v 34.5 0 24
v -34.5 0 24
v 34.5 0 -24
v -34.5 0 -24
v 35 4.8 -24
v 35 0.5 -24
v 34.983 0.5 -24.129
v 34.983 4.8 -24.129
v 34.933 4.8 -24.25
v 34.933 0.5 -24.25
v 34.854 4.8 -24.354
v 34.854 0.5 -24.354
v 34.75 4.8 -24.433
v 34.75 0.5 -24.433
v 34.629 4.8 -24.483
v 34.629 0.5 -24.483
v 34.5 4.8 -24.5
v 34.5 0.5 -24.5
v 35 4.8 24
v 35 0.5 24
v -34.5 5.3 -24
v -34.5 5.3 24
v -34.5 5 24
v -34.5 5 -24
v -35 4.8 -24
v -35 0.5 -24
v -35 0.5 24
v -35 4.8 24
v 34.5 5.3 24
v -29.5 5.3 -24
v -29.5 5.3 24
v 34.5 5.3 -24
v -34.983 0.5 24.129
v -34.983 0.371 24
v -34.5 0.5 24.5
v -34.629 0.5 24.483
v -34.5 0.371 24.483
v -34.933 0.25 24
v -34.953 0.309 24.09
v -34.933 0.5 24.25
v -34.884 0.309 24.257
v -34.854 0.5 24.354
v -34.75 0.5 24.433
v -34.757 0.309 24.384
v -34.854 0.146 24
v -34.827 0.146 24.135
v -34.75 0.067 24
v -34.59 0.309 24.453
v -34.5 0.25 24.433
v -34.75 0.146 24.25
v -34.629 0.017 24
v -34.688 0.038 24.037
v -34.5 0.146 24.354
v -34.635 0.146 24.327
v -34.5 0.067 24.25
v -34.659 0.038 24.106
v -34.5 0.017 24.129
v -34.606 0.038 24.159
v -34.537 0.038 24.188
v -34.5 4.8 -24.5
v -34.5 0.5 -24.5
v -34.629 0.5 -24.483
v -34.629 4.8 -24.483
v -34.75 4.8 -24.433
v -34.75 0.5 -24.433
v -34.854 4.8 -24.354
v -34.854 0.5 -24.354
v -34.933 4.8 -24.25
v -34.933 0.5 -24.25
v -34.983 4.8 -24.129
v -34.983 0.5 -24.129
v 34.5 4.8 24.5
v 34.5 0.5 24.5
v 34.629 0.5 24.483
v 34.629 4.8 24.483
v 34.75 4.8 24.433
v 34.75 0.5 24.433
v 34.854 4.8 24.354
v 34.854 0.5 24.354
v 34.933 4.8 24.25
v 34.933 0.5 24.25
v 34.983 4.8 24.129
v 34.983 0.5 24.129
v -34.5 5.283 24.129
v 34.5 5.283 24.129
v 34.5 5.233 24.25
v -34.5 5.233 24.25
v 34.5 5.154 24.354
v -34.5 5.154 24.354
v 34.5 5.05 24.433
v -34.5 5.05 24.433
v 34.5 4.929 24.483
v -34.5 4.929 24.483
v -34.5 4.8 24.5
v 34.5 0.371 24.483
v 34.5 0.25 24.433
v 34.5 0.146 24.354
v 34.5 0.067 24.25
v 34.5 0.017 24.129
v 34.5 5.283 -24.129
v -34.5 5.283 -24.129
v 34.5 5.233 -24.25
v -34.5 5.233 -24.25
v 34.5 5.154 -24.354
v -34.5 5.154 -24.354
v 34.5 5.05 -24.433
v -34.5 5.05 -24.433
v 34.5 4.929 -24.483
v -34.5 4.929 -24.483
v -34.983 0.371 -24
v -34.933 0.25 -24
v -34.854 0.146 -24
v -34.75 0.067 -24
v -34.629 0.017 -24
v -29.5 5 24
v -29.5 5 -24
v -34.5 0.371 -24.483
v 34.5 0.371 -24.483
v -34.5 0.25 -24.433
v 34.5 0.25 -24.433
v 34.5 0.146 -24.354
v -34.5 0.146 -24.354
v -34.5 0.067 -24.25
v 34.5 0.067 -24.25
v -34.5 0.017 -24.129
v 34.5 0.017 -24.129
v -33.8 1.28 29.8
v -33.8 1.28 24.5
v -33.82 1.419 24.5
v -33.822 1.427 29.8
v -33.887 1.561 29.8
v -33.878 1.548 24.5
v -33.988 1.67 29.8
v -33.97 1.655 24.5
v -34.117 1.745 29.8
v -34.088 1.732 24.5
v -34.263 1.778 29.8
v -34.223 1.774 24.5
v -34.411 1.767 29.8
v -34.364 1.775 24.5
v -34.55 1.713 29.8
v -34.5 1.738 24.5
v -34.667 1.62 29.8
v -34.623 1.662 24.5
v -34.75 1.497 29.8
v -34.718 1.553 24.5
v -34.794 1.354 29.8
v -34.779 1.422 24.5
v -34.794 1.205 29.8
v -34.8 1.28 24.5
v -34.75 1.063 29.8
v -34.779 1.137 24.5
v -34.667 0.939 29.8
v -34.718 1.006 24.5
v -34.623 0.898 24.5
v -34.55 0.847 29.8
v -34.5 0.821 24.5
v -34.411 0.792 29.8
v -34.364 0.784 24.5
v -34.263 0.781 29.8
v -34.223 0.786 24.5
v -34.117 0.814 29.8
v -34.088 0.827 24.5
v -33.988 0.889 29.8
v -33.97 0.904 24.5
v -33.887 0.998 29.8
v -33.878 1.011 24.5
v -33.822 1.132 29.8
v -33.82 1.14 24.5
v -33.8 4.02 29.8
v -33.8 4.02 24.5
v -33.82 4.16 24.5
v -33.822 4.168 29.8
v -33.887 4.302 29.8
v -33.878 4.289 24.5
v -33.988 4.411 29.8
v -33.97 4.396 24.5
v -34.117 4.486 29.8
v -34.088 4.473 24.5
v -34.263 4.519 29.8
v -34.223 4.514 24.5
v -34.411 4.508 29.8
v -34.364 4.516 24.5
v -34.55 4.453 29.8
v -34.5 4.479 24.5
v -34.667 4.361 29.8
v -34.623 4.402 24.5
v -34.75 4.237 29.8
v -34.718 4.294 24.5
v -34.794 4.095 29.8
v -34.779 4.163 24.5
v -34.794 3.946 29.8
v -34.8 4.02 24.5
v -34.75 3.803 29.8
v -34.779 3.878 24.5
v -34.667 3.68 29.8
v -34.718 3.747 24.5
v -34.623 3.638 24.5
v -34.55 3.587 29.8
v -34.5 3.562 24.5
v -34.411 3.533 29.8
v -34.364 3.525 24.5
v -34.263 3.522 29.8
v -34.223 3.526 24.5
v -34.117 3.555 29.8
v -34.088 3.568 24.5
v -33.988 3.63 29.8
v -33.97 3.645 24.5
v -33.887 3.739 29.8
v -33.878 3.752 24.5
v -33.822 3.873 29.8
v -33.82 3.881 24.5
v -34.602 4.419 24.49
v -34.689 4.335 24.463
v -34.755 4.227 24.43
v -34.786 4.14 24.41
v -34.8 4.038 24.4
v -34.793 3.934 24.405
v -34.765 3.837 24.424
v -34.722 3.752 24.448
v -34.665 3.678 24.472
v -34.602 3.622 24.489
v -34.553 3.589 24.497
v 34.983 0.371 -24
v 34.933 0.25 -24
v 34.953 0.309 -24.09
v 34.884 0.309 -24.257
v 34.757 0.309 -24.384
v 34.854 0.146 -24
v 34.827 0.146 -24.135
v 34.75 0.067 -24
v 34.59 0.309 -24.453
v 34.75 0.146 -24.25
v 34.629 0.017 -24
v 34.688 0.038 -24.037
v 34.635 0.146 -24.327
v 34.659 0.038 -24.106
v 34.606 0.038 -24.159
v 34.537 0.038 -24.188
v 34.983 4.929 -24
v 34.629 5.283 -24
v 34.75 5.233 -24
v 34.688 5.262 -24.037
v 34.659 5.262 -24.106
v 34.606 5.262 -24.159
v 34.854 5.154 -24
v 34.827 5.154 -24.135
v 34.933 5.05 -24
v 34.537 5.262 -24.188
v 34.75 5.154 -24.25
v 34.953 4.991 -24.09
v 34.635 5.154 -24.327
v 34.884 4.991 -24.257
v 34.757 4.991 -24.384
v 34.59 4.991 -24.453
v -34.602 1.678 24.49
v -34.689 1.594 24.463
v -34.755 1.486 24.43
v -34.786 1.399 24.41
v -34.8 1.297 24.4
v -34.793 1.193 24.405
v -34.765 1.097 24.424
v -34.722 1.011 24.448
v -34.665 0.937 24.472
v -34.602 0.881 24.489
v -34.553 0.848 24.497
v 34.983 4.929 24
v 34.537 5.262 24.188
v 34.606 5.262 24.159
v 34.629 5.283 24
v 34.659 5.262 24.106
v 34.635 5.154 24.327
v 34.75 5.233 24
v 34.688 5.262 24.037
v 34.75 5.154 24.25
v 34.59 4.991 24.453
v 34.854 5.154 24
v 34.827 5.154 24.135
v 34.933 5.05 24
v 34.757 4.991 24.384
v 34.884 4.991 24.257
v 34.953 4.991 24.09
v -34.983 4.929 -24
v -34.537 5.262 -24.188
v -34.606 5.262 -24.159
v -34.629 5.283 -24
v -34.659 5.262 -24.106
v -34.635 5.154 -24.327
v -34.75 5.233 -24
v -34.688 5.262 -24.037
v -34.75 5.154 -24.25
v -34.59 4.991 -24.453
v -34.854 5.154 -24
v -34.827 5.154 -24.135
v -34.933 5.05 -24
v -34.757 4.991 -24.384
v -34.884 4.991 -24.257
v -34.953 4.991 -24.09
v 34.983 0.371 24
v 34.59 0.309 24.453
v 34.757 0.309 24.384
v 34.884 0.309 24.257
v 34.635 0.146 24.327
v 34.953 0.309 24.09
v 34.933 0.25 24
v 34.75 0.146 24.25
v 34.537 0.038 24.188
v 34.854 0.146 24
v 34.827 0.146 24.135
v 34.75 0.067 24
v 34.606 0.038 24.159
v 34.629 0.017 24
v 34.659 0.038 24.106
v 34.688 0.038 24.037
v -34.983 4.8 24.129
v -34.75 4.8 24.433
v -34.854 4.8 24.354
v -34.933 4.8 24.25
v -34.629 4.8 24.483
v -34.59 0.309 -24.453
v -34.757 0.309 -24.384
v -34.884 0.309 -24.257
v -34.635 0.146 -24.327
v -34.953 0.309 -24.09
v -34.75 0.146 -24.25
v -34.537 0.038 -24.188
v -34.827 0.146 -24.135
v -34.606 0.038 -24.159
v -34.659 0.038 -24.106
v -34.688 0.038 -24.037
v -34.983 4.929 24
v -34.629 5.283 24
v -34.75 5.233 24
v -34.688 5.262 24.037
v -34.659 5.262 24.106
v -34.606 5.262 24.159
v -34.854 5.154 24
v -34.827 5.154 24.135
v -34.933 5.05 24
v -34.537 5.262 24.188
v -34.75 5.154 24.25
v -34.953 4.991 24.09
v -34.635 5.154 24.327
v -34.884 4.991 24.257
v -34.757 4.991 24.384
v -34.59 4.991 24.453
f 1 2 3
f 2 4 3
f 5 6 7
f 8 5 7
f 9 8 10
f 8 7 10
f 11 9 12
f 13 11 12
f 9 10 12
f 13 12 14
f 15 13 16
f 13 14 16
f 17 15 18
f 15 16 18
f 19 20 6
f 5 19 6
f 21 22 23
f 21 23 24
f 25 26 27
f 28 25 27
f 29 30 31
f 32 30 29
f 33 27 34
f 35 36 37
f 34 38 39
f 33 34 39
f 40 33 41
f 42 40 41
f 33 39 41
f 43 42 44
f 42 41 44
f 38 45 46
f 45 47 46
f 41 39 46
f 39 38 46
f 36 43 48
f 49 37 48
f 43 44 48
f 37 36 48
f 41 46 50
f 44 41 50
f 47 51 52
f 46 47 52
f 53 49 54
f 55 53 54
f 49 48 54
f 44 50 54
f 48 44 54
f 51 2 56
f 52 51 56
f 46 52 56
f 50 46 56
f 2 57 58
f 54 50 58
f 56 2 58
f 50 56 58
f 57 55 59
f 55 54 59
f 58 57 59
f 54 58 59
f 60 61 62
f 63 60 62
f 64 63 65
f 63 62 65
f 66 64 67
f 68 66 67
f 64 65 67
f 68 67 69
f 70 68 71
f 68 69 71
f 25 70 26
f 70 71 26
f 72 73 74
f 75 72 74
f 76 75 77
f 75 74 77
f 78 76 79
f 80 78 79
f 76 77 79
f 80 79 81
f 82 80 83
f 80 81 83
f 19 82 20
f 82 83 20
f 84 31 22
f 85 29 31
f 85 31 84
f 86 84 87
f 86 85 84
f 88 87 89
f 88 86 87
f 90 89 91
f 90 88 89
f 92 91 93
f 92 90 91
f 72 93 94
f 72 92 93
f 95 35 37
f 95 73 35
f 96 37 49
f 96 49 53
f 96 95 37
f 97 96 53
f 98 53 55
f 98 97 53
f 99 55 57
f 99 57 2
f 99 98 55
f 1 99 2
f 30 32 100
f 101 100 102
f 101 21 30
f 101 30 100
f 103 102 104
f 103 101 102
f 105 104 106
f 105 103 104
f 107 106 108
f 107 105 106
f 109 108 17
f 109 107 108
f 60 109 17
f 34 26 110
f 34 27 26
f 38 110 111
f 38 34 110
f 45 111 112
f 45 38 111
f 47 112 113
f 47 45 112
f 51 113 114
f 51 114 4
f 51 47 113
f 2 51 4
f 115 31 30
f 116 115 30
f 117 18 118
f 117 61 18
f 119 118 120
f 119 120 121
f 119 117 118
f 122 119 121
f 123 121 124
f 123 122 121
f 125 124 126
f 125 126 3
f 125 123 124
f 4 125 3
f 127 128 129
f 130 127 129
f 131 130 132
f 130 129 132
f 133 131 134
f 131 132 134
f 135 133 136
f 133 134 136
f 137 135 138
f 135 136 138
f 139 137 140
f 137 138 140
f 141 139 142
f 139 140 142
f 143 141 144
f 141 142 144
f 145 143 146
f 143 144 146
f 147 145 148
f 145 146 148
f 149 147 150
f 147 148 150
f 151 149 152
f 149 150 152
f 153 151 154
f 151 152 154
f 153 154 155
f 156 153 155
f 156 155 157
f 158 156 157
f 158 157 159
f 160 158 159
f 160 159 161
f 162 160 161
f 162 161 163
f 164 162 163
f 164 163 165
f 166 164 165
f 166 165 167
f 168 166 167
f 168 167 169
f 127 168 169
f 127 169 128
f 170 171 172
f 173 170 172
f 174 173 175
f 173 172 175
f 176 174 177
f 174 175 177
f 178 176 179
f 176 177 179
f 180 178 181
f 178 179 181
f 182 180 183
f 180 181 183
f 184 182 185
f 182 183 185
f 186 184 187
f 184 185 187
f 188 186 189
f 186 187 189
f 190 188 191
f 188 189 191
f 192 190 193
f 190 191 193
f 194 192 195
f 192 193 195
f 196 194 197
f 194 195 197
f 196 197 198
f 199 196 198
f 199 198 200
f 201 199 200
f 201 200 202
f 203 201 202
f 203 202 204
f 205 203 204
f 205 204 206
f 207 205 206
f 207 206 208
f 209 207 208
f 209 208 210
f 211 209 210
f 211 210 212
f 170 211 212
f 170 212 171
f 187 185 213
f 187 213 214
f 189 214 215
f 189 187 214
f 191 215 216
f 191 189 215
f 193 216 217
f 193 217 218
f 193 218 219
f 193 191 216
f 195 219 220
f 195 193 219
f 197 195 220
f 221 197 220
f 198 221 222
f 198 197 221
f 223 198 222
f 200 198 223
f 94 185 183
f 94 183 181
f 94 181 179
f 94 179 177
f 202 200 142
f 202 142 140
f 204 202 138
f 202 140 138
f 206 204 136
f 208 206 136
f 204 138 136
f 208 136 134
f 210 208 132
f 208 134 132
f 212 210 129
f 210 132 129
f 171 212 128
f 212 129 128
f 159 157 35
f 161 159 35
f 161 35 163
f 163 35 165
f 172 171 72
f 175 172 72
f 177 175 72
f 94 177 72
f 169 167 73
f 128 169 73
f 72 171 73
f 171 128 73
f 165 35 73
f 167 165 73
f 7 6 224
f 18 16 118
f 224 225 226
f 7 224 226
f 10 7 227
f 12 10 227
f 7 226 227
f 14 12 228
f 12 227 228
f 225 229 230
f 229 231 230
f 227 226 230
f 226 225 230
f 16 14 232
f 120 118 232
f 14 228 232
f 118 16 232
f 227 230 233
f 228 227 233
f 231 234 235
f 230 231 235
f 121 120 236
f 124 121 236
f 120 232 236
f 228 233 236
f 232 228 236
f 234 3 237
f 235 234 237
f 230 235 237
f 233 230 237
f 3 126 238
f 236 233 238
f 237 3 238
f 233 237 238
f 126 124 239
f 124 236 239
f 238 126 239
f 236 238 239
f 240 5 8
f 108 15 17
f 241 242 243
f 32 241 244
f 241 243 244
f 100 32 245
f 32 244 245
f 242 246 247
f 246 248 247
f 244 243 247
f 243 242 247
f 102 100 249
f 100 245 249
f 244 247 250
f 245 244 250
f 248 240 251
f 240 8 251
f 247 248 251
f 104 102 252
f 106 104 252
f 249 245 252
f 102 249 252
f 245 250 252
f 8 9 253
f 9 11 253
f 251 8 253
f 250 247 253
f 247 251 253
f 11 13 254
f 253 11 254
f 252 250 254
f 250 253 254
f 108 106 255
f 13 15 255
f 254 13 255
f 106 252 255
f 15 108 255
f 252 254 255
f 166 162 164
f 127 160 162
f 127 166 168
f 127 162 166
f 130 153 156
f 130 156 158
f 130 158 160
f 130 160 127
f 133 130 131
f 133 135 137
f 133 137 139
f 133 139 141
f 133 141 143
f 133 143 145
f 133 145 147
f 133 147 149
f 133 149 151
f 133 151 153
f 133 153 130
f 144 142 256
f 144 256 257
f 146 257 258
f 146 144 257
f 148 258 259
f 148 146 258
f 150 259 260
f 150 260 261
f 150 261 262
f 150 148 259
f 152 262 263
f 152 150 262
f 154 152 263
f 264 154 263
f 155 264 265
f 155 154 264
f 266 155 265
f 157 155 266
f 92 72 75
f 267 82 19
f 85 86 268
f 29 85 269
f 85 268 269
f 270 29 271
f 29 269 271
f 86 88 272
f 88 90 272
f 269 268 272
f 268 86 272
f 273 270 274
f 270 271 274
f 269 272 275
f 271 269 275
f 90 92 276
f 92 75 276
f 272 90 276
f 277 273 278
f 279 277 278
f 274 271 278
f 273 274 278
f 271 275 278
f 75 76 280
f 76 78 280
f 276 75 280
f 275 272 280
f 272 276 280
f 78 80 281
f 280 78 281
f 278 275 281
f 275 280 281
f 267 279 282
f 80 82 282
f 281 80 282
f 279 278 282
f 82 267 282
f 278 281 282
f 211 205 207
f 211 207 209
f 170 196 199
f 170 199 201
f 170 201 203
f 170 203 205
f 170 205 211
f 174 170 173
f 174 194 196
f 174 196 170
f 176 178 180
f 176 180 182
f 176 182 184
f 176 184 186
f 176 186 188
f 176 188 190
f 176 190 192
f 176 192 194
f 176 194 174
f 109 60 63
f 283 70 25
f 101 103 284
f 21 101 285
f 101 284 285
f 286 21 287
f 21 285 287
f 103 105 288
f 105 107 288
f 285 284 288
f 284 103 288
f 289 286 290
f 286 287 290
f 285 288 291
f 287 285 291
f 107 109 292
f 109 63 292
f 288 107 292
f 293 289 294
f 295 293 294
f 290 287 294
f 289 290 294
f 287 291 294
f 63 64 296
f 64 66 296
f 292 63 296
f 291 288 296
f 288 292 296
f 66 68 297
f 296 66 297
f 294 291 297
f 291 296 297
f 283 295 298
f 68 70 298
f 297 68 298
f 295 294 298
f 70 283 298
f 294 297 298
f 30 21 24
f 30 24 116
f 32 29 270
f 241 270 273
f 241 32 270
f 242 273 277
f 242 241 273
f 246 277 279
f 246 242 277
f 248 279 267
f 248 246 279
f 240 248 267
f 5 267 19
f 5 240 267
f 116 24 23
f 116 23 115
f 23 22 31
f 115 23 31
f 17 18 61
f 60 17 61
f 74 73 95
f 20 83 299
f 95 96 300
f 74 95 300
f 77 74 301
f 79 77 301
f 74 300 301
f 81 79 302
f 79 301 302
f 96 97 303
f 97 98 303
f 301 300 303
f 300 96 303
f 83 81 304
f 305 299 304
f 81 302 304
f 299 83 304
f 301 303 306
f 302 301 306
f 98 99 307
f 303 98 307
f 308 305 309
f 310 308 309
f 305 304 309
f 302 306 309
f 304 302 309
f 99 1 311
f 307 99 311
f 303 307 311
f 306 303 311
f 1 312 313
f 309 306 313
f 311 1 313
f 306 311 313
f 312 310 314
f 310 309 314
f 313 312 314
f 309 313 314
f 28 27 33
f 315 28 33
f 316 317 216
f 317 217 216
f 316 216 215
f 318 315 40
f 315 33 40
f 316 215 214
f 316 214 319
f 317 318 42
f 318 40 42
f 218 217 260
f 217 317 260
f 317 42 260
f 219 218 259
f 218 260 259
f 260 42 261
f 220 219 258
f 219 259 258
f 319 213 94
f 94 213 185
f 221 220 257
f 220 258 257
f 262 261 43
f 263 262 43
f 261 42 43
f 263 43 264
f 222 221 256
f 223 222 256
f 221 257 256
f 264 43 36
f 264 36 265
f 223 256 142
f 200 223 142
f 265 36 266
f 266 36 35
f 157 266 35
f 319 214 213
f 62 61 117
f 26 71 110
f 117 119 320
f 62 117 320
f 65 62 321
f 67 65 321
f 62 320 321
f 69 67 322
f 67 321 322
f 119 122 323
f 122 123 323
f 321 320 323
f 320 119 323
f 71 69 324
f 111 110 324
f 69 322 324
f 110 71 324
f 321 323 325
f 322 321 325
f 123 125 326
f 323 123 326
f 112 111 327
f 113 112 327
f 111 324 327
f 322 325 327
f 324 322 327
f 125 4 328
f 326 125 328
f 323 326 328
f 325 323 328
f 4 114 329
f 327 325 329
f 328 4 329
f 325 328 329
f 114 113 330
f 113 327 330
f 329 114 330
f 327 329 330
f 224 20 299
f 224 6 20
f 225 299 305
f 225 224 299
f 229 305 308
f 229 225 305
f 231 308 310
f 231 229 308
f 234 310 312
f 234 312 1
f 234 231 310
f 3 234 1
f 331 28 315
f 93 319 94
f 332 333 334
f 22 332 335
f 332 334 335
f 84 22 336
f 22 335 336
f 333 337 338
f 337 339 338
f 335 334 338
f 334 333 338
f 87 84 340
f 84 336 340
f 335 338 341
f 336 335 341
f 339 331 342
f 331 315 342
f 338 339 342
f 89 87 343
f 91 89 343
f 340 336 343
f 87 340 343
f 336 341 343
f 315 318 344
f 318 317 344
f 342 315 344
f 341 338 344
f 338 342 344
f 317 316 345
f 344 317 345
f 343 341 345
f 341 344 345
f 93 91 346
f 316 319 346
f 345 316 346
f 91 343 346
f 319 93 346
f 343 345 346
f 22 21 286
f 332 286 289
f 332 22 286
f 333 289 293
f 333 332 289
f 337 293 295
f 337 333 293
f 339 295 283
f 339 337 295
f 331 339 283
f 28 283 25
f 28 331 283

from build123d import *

# Parameters (mm, degrees)
BOSS_EXTRUDE2_DEPTH      = 5.3
SKETCH2_R                = 0.5
BOSS_EXTRUDE3_DEPTH      = 5.3
BOSS_EXTRUDE3_DEPTH_BACK = 1
FILLET2_R                = 0.5
SKETCH4_W                = 5
SKETCH4_H                = 48
CUT_EXTRUDE1_DEPTH       = 0.3


with BuildPart() as part:
    # Sketch1 → Boss-Extrude2 (new body)
    with BuildSketch(Plane(origin=(0, 0, 0), x_dir=(1, 0, 0), z_dir=(0, 1, 0))):
        with BuildLine():
            Line((-34.5, -24.5), (34.5, -24.5))
            ThreePointArc((34.5, -24.5), (34.853553391, -24.353553391), (35, -24))
            Line((35, -24), (35, 24))
            ThreePointArc((35, 24), (34.853553391, 24.353553391), (34.5, 24.5))
            Line((34.5, 24.5), (-34.5, 24.5))
            ThreePointArc((-34.5, 24.5), (-34.853553391, 24.353553391), (-35, 24))
            Line((-35, 24), (-35, -24))
            ThreePointArc((-35, -24), (-34.853553391, -24.353553391), (-34.5, -24.5))
        make_face()
    extrude(amount=BOSS_EXTRUDE2_DEPTH)

    # Sketch2 → Boss-Extrude3 (add, two sides)
    with BuildSketch(Plane.XY.offset(24.5)) as boss_extrude3_sk:
        with Locations((-34.3, 1.279563796)):
            Circle(SKETCH2_R)
        with Locations((-34.3, 4.020436204)):
            Circle(SKETCH2_R)
    extrude(amount=BOSS_EXTRUDE3_DEPTH)
    extrude(boss_extrude3_sk.sketch, amount=-BOSS_EXTRUDE3_DEPTH_BACK)

    # Fillet2
    fillet2_edges = [part.edges().sort_by_distance(p)[0] for p in [
        (34.853553391, 5.3, 24.353553391),
        (0, 0, 24.5),
        (-34.853553391, 0, 24.353553391),
        (35, 5.3, 0),
        (34.853553391, 5.3, -24.353553391),
        (0, 5.3, -24.5),
        (-34.853553391, 5.3, -24.353553391),
        (-35, 5.3, 0),
        (-34.853553391, 5.3, 24.353553391),
        (0, 5.3, 24.5),
        (-35, 0, 0),
        (-34.853553391, 0, -24.353553391),
        (0, 0, -24.5),
        (34.853553391, 0, -24.353553391),
        (35, 0, 0),
        (34.853553391, 0, 24.353553391),
    ]]
    fillet(fillet2_edges, radius=FILLET2_R)

    # Sketch4 → Cut-Extrude1 (cut)
    with BuildSketch(Plane(origin=(0, 5.3, 0), x_dir=(1, 0, 0), z_dir=(0, 1, 0))):
        with Locations((-32, 0)):
            Rectangle(SKETCH4_W, SKETCH4_H)
    extrude(amount=-CUT_EXTRUDE1_DEPTH, mode=Mode.SUBTRACT)


solid = part.part
